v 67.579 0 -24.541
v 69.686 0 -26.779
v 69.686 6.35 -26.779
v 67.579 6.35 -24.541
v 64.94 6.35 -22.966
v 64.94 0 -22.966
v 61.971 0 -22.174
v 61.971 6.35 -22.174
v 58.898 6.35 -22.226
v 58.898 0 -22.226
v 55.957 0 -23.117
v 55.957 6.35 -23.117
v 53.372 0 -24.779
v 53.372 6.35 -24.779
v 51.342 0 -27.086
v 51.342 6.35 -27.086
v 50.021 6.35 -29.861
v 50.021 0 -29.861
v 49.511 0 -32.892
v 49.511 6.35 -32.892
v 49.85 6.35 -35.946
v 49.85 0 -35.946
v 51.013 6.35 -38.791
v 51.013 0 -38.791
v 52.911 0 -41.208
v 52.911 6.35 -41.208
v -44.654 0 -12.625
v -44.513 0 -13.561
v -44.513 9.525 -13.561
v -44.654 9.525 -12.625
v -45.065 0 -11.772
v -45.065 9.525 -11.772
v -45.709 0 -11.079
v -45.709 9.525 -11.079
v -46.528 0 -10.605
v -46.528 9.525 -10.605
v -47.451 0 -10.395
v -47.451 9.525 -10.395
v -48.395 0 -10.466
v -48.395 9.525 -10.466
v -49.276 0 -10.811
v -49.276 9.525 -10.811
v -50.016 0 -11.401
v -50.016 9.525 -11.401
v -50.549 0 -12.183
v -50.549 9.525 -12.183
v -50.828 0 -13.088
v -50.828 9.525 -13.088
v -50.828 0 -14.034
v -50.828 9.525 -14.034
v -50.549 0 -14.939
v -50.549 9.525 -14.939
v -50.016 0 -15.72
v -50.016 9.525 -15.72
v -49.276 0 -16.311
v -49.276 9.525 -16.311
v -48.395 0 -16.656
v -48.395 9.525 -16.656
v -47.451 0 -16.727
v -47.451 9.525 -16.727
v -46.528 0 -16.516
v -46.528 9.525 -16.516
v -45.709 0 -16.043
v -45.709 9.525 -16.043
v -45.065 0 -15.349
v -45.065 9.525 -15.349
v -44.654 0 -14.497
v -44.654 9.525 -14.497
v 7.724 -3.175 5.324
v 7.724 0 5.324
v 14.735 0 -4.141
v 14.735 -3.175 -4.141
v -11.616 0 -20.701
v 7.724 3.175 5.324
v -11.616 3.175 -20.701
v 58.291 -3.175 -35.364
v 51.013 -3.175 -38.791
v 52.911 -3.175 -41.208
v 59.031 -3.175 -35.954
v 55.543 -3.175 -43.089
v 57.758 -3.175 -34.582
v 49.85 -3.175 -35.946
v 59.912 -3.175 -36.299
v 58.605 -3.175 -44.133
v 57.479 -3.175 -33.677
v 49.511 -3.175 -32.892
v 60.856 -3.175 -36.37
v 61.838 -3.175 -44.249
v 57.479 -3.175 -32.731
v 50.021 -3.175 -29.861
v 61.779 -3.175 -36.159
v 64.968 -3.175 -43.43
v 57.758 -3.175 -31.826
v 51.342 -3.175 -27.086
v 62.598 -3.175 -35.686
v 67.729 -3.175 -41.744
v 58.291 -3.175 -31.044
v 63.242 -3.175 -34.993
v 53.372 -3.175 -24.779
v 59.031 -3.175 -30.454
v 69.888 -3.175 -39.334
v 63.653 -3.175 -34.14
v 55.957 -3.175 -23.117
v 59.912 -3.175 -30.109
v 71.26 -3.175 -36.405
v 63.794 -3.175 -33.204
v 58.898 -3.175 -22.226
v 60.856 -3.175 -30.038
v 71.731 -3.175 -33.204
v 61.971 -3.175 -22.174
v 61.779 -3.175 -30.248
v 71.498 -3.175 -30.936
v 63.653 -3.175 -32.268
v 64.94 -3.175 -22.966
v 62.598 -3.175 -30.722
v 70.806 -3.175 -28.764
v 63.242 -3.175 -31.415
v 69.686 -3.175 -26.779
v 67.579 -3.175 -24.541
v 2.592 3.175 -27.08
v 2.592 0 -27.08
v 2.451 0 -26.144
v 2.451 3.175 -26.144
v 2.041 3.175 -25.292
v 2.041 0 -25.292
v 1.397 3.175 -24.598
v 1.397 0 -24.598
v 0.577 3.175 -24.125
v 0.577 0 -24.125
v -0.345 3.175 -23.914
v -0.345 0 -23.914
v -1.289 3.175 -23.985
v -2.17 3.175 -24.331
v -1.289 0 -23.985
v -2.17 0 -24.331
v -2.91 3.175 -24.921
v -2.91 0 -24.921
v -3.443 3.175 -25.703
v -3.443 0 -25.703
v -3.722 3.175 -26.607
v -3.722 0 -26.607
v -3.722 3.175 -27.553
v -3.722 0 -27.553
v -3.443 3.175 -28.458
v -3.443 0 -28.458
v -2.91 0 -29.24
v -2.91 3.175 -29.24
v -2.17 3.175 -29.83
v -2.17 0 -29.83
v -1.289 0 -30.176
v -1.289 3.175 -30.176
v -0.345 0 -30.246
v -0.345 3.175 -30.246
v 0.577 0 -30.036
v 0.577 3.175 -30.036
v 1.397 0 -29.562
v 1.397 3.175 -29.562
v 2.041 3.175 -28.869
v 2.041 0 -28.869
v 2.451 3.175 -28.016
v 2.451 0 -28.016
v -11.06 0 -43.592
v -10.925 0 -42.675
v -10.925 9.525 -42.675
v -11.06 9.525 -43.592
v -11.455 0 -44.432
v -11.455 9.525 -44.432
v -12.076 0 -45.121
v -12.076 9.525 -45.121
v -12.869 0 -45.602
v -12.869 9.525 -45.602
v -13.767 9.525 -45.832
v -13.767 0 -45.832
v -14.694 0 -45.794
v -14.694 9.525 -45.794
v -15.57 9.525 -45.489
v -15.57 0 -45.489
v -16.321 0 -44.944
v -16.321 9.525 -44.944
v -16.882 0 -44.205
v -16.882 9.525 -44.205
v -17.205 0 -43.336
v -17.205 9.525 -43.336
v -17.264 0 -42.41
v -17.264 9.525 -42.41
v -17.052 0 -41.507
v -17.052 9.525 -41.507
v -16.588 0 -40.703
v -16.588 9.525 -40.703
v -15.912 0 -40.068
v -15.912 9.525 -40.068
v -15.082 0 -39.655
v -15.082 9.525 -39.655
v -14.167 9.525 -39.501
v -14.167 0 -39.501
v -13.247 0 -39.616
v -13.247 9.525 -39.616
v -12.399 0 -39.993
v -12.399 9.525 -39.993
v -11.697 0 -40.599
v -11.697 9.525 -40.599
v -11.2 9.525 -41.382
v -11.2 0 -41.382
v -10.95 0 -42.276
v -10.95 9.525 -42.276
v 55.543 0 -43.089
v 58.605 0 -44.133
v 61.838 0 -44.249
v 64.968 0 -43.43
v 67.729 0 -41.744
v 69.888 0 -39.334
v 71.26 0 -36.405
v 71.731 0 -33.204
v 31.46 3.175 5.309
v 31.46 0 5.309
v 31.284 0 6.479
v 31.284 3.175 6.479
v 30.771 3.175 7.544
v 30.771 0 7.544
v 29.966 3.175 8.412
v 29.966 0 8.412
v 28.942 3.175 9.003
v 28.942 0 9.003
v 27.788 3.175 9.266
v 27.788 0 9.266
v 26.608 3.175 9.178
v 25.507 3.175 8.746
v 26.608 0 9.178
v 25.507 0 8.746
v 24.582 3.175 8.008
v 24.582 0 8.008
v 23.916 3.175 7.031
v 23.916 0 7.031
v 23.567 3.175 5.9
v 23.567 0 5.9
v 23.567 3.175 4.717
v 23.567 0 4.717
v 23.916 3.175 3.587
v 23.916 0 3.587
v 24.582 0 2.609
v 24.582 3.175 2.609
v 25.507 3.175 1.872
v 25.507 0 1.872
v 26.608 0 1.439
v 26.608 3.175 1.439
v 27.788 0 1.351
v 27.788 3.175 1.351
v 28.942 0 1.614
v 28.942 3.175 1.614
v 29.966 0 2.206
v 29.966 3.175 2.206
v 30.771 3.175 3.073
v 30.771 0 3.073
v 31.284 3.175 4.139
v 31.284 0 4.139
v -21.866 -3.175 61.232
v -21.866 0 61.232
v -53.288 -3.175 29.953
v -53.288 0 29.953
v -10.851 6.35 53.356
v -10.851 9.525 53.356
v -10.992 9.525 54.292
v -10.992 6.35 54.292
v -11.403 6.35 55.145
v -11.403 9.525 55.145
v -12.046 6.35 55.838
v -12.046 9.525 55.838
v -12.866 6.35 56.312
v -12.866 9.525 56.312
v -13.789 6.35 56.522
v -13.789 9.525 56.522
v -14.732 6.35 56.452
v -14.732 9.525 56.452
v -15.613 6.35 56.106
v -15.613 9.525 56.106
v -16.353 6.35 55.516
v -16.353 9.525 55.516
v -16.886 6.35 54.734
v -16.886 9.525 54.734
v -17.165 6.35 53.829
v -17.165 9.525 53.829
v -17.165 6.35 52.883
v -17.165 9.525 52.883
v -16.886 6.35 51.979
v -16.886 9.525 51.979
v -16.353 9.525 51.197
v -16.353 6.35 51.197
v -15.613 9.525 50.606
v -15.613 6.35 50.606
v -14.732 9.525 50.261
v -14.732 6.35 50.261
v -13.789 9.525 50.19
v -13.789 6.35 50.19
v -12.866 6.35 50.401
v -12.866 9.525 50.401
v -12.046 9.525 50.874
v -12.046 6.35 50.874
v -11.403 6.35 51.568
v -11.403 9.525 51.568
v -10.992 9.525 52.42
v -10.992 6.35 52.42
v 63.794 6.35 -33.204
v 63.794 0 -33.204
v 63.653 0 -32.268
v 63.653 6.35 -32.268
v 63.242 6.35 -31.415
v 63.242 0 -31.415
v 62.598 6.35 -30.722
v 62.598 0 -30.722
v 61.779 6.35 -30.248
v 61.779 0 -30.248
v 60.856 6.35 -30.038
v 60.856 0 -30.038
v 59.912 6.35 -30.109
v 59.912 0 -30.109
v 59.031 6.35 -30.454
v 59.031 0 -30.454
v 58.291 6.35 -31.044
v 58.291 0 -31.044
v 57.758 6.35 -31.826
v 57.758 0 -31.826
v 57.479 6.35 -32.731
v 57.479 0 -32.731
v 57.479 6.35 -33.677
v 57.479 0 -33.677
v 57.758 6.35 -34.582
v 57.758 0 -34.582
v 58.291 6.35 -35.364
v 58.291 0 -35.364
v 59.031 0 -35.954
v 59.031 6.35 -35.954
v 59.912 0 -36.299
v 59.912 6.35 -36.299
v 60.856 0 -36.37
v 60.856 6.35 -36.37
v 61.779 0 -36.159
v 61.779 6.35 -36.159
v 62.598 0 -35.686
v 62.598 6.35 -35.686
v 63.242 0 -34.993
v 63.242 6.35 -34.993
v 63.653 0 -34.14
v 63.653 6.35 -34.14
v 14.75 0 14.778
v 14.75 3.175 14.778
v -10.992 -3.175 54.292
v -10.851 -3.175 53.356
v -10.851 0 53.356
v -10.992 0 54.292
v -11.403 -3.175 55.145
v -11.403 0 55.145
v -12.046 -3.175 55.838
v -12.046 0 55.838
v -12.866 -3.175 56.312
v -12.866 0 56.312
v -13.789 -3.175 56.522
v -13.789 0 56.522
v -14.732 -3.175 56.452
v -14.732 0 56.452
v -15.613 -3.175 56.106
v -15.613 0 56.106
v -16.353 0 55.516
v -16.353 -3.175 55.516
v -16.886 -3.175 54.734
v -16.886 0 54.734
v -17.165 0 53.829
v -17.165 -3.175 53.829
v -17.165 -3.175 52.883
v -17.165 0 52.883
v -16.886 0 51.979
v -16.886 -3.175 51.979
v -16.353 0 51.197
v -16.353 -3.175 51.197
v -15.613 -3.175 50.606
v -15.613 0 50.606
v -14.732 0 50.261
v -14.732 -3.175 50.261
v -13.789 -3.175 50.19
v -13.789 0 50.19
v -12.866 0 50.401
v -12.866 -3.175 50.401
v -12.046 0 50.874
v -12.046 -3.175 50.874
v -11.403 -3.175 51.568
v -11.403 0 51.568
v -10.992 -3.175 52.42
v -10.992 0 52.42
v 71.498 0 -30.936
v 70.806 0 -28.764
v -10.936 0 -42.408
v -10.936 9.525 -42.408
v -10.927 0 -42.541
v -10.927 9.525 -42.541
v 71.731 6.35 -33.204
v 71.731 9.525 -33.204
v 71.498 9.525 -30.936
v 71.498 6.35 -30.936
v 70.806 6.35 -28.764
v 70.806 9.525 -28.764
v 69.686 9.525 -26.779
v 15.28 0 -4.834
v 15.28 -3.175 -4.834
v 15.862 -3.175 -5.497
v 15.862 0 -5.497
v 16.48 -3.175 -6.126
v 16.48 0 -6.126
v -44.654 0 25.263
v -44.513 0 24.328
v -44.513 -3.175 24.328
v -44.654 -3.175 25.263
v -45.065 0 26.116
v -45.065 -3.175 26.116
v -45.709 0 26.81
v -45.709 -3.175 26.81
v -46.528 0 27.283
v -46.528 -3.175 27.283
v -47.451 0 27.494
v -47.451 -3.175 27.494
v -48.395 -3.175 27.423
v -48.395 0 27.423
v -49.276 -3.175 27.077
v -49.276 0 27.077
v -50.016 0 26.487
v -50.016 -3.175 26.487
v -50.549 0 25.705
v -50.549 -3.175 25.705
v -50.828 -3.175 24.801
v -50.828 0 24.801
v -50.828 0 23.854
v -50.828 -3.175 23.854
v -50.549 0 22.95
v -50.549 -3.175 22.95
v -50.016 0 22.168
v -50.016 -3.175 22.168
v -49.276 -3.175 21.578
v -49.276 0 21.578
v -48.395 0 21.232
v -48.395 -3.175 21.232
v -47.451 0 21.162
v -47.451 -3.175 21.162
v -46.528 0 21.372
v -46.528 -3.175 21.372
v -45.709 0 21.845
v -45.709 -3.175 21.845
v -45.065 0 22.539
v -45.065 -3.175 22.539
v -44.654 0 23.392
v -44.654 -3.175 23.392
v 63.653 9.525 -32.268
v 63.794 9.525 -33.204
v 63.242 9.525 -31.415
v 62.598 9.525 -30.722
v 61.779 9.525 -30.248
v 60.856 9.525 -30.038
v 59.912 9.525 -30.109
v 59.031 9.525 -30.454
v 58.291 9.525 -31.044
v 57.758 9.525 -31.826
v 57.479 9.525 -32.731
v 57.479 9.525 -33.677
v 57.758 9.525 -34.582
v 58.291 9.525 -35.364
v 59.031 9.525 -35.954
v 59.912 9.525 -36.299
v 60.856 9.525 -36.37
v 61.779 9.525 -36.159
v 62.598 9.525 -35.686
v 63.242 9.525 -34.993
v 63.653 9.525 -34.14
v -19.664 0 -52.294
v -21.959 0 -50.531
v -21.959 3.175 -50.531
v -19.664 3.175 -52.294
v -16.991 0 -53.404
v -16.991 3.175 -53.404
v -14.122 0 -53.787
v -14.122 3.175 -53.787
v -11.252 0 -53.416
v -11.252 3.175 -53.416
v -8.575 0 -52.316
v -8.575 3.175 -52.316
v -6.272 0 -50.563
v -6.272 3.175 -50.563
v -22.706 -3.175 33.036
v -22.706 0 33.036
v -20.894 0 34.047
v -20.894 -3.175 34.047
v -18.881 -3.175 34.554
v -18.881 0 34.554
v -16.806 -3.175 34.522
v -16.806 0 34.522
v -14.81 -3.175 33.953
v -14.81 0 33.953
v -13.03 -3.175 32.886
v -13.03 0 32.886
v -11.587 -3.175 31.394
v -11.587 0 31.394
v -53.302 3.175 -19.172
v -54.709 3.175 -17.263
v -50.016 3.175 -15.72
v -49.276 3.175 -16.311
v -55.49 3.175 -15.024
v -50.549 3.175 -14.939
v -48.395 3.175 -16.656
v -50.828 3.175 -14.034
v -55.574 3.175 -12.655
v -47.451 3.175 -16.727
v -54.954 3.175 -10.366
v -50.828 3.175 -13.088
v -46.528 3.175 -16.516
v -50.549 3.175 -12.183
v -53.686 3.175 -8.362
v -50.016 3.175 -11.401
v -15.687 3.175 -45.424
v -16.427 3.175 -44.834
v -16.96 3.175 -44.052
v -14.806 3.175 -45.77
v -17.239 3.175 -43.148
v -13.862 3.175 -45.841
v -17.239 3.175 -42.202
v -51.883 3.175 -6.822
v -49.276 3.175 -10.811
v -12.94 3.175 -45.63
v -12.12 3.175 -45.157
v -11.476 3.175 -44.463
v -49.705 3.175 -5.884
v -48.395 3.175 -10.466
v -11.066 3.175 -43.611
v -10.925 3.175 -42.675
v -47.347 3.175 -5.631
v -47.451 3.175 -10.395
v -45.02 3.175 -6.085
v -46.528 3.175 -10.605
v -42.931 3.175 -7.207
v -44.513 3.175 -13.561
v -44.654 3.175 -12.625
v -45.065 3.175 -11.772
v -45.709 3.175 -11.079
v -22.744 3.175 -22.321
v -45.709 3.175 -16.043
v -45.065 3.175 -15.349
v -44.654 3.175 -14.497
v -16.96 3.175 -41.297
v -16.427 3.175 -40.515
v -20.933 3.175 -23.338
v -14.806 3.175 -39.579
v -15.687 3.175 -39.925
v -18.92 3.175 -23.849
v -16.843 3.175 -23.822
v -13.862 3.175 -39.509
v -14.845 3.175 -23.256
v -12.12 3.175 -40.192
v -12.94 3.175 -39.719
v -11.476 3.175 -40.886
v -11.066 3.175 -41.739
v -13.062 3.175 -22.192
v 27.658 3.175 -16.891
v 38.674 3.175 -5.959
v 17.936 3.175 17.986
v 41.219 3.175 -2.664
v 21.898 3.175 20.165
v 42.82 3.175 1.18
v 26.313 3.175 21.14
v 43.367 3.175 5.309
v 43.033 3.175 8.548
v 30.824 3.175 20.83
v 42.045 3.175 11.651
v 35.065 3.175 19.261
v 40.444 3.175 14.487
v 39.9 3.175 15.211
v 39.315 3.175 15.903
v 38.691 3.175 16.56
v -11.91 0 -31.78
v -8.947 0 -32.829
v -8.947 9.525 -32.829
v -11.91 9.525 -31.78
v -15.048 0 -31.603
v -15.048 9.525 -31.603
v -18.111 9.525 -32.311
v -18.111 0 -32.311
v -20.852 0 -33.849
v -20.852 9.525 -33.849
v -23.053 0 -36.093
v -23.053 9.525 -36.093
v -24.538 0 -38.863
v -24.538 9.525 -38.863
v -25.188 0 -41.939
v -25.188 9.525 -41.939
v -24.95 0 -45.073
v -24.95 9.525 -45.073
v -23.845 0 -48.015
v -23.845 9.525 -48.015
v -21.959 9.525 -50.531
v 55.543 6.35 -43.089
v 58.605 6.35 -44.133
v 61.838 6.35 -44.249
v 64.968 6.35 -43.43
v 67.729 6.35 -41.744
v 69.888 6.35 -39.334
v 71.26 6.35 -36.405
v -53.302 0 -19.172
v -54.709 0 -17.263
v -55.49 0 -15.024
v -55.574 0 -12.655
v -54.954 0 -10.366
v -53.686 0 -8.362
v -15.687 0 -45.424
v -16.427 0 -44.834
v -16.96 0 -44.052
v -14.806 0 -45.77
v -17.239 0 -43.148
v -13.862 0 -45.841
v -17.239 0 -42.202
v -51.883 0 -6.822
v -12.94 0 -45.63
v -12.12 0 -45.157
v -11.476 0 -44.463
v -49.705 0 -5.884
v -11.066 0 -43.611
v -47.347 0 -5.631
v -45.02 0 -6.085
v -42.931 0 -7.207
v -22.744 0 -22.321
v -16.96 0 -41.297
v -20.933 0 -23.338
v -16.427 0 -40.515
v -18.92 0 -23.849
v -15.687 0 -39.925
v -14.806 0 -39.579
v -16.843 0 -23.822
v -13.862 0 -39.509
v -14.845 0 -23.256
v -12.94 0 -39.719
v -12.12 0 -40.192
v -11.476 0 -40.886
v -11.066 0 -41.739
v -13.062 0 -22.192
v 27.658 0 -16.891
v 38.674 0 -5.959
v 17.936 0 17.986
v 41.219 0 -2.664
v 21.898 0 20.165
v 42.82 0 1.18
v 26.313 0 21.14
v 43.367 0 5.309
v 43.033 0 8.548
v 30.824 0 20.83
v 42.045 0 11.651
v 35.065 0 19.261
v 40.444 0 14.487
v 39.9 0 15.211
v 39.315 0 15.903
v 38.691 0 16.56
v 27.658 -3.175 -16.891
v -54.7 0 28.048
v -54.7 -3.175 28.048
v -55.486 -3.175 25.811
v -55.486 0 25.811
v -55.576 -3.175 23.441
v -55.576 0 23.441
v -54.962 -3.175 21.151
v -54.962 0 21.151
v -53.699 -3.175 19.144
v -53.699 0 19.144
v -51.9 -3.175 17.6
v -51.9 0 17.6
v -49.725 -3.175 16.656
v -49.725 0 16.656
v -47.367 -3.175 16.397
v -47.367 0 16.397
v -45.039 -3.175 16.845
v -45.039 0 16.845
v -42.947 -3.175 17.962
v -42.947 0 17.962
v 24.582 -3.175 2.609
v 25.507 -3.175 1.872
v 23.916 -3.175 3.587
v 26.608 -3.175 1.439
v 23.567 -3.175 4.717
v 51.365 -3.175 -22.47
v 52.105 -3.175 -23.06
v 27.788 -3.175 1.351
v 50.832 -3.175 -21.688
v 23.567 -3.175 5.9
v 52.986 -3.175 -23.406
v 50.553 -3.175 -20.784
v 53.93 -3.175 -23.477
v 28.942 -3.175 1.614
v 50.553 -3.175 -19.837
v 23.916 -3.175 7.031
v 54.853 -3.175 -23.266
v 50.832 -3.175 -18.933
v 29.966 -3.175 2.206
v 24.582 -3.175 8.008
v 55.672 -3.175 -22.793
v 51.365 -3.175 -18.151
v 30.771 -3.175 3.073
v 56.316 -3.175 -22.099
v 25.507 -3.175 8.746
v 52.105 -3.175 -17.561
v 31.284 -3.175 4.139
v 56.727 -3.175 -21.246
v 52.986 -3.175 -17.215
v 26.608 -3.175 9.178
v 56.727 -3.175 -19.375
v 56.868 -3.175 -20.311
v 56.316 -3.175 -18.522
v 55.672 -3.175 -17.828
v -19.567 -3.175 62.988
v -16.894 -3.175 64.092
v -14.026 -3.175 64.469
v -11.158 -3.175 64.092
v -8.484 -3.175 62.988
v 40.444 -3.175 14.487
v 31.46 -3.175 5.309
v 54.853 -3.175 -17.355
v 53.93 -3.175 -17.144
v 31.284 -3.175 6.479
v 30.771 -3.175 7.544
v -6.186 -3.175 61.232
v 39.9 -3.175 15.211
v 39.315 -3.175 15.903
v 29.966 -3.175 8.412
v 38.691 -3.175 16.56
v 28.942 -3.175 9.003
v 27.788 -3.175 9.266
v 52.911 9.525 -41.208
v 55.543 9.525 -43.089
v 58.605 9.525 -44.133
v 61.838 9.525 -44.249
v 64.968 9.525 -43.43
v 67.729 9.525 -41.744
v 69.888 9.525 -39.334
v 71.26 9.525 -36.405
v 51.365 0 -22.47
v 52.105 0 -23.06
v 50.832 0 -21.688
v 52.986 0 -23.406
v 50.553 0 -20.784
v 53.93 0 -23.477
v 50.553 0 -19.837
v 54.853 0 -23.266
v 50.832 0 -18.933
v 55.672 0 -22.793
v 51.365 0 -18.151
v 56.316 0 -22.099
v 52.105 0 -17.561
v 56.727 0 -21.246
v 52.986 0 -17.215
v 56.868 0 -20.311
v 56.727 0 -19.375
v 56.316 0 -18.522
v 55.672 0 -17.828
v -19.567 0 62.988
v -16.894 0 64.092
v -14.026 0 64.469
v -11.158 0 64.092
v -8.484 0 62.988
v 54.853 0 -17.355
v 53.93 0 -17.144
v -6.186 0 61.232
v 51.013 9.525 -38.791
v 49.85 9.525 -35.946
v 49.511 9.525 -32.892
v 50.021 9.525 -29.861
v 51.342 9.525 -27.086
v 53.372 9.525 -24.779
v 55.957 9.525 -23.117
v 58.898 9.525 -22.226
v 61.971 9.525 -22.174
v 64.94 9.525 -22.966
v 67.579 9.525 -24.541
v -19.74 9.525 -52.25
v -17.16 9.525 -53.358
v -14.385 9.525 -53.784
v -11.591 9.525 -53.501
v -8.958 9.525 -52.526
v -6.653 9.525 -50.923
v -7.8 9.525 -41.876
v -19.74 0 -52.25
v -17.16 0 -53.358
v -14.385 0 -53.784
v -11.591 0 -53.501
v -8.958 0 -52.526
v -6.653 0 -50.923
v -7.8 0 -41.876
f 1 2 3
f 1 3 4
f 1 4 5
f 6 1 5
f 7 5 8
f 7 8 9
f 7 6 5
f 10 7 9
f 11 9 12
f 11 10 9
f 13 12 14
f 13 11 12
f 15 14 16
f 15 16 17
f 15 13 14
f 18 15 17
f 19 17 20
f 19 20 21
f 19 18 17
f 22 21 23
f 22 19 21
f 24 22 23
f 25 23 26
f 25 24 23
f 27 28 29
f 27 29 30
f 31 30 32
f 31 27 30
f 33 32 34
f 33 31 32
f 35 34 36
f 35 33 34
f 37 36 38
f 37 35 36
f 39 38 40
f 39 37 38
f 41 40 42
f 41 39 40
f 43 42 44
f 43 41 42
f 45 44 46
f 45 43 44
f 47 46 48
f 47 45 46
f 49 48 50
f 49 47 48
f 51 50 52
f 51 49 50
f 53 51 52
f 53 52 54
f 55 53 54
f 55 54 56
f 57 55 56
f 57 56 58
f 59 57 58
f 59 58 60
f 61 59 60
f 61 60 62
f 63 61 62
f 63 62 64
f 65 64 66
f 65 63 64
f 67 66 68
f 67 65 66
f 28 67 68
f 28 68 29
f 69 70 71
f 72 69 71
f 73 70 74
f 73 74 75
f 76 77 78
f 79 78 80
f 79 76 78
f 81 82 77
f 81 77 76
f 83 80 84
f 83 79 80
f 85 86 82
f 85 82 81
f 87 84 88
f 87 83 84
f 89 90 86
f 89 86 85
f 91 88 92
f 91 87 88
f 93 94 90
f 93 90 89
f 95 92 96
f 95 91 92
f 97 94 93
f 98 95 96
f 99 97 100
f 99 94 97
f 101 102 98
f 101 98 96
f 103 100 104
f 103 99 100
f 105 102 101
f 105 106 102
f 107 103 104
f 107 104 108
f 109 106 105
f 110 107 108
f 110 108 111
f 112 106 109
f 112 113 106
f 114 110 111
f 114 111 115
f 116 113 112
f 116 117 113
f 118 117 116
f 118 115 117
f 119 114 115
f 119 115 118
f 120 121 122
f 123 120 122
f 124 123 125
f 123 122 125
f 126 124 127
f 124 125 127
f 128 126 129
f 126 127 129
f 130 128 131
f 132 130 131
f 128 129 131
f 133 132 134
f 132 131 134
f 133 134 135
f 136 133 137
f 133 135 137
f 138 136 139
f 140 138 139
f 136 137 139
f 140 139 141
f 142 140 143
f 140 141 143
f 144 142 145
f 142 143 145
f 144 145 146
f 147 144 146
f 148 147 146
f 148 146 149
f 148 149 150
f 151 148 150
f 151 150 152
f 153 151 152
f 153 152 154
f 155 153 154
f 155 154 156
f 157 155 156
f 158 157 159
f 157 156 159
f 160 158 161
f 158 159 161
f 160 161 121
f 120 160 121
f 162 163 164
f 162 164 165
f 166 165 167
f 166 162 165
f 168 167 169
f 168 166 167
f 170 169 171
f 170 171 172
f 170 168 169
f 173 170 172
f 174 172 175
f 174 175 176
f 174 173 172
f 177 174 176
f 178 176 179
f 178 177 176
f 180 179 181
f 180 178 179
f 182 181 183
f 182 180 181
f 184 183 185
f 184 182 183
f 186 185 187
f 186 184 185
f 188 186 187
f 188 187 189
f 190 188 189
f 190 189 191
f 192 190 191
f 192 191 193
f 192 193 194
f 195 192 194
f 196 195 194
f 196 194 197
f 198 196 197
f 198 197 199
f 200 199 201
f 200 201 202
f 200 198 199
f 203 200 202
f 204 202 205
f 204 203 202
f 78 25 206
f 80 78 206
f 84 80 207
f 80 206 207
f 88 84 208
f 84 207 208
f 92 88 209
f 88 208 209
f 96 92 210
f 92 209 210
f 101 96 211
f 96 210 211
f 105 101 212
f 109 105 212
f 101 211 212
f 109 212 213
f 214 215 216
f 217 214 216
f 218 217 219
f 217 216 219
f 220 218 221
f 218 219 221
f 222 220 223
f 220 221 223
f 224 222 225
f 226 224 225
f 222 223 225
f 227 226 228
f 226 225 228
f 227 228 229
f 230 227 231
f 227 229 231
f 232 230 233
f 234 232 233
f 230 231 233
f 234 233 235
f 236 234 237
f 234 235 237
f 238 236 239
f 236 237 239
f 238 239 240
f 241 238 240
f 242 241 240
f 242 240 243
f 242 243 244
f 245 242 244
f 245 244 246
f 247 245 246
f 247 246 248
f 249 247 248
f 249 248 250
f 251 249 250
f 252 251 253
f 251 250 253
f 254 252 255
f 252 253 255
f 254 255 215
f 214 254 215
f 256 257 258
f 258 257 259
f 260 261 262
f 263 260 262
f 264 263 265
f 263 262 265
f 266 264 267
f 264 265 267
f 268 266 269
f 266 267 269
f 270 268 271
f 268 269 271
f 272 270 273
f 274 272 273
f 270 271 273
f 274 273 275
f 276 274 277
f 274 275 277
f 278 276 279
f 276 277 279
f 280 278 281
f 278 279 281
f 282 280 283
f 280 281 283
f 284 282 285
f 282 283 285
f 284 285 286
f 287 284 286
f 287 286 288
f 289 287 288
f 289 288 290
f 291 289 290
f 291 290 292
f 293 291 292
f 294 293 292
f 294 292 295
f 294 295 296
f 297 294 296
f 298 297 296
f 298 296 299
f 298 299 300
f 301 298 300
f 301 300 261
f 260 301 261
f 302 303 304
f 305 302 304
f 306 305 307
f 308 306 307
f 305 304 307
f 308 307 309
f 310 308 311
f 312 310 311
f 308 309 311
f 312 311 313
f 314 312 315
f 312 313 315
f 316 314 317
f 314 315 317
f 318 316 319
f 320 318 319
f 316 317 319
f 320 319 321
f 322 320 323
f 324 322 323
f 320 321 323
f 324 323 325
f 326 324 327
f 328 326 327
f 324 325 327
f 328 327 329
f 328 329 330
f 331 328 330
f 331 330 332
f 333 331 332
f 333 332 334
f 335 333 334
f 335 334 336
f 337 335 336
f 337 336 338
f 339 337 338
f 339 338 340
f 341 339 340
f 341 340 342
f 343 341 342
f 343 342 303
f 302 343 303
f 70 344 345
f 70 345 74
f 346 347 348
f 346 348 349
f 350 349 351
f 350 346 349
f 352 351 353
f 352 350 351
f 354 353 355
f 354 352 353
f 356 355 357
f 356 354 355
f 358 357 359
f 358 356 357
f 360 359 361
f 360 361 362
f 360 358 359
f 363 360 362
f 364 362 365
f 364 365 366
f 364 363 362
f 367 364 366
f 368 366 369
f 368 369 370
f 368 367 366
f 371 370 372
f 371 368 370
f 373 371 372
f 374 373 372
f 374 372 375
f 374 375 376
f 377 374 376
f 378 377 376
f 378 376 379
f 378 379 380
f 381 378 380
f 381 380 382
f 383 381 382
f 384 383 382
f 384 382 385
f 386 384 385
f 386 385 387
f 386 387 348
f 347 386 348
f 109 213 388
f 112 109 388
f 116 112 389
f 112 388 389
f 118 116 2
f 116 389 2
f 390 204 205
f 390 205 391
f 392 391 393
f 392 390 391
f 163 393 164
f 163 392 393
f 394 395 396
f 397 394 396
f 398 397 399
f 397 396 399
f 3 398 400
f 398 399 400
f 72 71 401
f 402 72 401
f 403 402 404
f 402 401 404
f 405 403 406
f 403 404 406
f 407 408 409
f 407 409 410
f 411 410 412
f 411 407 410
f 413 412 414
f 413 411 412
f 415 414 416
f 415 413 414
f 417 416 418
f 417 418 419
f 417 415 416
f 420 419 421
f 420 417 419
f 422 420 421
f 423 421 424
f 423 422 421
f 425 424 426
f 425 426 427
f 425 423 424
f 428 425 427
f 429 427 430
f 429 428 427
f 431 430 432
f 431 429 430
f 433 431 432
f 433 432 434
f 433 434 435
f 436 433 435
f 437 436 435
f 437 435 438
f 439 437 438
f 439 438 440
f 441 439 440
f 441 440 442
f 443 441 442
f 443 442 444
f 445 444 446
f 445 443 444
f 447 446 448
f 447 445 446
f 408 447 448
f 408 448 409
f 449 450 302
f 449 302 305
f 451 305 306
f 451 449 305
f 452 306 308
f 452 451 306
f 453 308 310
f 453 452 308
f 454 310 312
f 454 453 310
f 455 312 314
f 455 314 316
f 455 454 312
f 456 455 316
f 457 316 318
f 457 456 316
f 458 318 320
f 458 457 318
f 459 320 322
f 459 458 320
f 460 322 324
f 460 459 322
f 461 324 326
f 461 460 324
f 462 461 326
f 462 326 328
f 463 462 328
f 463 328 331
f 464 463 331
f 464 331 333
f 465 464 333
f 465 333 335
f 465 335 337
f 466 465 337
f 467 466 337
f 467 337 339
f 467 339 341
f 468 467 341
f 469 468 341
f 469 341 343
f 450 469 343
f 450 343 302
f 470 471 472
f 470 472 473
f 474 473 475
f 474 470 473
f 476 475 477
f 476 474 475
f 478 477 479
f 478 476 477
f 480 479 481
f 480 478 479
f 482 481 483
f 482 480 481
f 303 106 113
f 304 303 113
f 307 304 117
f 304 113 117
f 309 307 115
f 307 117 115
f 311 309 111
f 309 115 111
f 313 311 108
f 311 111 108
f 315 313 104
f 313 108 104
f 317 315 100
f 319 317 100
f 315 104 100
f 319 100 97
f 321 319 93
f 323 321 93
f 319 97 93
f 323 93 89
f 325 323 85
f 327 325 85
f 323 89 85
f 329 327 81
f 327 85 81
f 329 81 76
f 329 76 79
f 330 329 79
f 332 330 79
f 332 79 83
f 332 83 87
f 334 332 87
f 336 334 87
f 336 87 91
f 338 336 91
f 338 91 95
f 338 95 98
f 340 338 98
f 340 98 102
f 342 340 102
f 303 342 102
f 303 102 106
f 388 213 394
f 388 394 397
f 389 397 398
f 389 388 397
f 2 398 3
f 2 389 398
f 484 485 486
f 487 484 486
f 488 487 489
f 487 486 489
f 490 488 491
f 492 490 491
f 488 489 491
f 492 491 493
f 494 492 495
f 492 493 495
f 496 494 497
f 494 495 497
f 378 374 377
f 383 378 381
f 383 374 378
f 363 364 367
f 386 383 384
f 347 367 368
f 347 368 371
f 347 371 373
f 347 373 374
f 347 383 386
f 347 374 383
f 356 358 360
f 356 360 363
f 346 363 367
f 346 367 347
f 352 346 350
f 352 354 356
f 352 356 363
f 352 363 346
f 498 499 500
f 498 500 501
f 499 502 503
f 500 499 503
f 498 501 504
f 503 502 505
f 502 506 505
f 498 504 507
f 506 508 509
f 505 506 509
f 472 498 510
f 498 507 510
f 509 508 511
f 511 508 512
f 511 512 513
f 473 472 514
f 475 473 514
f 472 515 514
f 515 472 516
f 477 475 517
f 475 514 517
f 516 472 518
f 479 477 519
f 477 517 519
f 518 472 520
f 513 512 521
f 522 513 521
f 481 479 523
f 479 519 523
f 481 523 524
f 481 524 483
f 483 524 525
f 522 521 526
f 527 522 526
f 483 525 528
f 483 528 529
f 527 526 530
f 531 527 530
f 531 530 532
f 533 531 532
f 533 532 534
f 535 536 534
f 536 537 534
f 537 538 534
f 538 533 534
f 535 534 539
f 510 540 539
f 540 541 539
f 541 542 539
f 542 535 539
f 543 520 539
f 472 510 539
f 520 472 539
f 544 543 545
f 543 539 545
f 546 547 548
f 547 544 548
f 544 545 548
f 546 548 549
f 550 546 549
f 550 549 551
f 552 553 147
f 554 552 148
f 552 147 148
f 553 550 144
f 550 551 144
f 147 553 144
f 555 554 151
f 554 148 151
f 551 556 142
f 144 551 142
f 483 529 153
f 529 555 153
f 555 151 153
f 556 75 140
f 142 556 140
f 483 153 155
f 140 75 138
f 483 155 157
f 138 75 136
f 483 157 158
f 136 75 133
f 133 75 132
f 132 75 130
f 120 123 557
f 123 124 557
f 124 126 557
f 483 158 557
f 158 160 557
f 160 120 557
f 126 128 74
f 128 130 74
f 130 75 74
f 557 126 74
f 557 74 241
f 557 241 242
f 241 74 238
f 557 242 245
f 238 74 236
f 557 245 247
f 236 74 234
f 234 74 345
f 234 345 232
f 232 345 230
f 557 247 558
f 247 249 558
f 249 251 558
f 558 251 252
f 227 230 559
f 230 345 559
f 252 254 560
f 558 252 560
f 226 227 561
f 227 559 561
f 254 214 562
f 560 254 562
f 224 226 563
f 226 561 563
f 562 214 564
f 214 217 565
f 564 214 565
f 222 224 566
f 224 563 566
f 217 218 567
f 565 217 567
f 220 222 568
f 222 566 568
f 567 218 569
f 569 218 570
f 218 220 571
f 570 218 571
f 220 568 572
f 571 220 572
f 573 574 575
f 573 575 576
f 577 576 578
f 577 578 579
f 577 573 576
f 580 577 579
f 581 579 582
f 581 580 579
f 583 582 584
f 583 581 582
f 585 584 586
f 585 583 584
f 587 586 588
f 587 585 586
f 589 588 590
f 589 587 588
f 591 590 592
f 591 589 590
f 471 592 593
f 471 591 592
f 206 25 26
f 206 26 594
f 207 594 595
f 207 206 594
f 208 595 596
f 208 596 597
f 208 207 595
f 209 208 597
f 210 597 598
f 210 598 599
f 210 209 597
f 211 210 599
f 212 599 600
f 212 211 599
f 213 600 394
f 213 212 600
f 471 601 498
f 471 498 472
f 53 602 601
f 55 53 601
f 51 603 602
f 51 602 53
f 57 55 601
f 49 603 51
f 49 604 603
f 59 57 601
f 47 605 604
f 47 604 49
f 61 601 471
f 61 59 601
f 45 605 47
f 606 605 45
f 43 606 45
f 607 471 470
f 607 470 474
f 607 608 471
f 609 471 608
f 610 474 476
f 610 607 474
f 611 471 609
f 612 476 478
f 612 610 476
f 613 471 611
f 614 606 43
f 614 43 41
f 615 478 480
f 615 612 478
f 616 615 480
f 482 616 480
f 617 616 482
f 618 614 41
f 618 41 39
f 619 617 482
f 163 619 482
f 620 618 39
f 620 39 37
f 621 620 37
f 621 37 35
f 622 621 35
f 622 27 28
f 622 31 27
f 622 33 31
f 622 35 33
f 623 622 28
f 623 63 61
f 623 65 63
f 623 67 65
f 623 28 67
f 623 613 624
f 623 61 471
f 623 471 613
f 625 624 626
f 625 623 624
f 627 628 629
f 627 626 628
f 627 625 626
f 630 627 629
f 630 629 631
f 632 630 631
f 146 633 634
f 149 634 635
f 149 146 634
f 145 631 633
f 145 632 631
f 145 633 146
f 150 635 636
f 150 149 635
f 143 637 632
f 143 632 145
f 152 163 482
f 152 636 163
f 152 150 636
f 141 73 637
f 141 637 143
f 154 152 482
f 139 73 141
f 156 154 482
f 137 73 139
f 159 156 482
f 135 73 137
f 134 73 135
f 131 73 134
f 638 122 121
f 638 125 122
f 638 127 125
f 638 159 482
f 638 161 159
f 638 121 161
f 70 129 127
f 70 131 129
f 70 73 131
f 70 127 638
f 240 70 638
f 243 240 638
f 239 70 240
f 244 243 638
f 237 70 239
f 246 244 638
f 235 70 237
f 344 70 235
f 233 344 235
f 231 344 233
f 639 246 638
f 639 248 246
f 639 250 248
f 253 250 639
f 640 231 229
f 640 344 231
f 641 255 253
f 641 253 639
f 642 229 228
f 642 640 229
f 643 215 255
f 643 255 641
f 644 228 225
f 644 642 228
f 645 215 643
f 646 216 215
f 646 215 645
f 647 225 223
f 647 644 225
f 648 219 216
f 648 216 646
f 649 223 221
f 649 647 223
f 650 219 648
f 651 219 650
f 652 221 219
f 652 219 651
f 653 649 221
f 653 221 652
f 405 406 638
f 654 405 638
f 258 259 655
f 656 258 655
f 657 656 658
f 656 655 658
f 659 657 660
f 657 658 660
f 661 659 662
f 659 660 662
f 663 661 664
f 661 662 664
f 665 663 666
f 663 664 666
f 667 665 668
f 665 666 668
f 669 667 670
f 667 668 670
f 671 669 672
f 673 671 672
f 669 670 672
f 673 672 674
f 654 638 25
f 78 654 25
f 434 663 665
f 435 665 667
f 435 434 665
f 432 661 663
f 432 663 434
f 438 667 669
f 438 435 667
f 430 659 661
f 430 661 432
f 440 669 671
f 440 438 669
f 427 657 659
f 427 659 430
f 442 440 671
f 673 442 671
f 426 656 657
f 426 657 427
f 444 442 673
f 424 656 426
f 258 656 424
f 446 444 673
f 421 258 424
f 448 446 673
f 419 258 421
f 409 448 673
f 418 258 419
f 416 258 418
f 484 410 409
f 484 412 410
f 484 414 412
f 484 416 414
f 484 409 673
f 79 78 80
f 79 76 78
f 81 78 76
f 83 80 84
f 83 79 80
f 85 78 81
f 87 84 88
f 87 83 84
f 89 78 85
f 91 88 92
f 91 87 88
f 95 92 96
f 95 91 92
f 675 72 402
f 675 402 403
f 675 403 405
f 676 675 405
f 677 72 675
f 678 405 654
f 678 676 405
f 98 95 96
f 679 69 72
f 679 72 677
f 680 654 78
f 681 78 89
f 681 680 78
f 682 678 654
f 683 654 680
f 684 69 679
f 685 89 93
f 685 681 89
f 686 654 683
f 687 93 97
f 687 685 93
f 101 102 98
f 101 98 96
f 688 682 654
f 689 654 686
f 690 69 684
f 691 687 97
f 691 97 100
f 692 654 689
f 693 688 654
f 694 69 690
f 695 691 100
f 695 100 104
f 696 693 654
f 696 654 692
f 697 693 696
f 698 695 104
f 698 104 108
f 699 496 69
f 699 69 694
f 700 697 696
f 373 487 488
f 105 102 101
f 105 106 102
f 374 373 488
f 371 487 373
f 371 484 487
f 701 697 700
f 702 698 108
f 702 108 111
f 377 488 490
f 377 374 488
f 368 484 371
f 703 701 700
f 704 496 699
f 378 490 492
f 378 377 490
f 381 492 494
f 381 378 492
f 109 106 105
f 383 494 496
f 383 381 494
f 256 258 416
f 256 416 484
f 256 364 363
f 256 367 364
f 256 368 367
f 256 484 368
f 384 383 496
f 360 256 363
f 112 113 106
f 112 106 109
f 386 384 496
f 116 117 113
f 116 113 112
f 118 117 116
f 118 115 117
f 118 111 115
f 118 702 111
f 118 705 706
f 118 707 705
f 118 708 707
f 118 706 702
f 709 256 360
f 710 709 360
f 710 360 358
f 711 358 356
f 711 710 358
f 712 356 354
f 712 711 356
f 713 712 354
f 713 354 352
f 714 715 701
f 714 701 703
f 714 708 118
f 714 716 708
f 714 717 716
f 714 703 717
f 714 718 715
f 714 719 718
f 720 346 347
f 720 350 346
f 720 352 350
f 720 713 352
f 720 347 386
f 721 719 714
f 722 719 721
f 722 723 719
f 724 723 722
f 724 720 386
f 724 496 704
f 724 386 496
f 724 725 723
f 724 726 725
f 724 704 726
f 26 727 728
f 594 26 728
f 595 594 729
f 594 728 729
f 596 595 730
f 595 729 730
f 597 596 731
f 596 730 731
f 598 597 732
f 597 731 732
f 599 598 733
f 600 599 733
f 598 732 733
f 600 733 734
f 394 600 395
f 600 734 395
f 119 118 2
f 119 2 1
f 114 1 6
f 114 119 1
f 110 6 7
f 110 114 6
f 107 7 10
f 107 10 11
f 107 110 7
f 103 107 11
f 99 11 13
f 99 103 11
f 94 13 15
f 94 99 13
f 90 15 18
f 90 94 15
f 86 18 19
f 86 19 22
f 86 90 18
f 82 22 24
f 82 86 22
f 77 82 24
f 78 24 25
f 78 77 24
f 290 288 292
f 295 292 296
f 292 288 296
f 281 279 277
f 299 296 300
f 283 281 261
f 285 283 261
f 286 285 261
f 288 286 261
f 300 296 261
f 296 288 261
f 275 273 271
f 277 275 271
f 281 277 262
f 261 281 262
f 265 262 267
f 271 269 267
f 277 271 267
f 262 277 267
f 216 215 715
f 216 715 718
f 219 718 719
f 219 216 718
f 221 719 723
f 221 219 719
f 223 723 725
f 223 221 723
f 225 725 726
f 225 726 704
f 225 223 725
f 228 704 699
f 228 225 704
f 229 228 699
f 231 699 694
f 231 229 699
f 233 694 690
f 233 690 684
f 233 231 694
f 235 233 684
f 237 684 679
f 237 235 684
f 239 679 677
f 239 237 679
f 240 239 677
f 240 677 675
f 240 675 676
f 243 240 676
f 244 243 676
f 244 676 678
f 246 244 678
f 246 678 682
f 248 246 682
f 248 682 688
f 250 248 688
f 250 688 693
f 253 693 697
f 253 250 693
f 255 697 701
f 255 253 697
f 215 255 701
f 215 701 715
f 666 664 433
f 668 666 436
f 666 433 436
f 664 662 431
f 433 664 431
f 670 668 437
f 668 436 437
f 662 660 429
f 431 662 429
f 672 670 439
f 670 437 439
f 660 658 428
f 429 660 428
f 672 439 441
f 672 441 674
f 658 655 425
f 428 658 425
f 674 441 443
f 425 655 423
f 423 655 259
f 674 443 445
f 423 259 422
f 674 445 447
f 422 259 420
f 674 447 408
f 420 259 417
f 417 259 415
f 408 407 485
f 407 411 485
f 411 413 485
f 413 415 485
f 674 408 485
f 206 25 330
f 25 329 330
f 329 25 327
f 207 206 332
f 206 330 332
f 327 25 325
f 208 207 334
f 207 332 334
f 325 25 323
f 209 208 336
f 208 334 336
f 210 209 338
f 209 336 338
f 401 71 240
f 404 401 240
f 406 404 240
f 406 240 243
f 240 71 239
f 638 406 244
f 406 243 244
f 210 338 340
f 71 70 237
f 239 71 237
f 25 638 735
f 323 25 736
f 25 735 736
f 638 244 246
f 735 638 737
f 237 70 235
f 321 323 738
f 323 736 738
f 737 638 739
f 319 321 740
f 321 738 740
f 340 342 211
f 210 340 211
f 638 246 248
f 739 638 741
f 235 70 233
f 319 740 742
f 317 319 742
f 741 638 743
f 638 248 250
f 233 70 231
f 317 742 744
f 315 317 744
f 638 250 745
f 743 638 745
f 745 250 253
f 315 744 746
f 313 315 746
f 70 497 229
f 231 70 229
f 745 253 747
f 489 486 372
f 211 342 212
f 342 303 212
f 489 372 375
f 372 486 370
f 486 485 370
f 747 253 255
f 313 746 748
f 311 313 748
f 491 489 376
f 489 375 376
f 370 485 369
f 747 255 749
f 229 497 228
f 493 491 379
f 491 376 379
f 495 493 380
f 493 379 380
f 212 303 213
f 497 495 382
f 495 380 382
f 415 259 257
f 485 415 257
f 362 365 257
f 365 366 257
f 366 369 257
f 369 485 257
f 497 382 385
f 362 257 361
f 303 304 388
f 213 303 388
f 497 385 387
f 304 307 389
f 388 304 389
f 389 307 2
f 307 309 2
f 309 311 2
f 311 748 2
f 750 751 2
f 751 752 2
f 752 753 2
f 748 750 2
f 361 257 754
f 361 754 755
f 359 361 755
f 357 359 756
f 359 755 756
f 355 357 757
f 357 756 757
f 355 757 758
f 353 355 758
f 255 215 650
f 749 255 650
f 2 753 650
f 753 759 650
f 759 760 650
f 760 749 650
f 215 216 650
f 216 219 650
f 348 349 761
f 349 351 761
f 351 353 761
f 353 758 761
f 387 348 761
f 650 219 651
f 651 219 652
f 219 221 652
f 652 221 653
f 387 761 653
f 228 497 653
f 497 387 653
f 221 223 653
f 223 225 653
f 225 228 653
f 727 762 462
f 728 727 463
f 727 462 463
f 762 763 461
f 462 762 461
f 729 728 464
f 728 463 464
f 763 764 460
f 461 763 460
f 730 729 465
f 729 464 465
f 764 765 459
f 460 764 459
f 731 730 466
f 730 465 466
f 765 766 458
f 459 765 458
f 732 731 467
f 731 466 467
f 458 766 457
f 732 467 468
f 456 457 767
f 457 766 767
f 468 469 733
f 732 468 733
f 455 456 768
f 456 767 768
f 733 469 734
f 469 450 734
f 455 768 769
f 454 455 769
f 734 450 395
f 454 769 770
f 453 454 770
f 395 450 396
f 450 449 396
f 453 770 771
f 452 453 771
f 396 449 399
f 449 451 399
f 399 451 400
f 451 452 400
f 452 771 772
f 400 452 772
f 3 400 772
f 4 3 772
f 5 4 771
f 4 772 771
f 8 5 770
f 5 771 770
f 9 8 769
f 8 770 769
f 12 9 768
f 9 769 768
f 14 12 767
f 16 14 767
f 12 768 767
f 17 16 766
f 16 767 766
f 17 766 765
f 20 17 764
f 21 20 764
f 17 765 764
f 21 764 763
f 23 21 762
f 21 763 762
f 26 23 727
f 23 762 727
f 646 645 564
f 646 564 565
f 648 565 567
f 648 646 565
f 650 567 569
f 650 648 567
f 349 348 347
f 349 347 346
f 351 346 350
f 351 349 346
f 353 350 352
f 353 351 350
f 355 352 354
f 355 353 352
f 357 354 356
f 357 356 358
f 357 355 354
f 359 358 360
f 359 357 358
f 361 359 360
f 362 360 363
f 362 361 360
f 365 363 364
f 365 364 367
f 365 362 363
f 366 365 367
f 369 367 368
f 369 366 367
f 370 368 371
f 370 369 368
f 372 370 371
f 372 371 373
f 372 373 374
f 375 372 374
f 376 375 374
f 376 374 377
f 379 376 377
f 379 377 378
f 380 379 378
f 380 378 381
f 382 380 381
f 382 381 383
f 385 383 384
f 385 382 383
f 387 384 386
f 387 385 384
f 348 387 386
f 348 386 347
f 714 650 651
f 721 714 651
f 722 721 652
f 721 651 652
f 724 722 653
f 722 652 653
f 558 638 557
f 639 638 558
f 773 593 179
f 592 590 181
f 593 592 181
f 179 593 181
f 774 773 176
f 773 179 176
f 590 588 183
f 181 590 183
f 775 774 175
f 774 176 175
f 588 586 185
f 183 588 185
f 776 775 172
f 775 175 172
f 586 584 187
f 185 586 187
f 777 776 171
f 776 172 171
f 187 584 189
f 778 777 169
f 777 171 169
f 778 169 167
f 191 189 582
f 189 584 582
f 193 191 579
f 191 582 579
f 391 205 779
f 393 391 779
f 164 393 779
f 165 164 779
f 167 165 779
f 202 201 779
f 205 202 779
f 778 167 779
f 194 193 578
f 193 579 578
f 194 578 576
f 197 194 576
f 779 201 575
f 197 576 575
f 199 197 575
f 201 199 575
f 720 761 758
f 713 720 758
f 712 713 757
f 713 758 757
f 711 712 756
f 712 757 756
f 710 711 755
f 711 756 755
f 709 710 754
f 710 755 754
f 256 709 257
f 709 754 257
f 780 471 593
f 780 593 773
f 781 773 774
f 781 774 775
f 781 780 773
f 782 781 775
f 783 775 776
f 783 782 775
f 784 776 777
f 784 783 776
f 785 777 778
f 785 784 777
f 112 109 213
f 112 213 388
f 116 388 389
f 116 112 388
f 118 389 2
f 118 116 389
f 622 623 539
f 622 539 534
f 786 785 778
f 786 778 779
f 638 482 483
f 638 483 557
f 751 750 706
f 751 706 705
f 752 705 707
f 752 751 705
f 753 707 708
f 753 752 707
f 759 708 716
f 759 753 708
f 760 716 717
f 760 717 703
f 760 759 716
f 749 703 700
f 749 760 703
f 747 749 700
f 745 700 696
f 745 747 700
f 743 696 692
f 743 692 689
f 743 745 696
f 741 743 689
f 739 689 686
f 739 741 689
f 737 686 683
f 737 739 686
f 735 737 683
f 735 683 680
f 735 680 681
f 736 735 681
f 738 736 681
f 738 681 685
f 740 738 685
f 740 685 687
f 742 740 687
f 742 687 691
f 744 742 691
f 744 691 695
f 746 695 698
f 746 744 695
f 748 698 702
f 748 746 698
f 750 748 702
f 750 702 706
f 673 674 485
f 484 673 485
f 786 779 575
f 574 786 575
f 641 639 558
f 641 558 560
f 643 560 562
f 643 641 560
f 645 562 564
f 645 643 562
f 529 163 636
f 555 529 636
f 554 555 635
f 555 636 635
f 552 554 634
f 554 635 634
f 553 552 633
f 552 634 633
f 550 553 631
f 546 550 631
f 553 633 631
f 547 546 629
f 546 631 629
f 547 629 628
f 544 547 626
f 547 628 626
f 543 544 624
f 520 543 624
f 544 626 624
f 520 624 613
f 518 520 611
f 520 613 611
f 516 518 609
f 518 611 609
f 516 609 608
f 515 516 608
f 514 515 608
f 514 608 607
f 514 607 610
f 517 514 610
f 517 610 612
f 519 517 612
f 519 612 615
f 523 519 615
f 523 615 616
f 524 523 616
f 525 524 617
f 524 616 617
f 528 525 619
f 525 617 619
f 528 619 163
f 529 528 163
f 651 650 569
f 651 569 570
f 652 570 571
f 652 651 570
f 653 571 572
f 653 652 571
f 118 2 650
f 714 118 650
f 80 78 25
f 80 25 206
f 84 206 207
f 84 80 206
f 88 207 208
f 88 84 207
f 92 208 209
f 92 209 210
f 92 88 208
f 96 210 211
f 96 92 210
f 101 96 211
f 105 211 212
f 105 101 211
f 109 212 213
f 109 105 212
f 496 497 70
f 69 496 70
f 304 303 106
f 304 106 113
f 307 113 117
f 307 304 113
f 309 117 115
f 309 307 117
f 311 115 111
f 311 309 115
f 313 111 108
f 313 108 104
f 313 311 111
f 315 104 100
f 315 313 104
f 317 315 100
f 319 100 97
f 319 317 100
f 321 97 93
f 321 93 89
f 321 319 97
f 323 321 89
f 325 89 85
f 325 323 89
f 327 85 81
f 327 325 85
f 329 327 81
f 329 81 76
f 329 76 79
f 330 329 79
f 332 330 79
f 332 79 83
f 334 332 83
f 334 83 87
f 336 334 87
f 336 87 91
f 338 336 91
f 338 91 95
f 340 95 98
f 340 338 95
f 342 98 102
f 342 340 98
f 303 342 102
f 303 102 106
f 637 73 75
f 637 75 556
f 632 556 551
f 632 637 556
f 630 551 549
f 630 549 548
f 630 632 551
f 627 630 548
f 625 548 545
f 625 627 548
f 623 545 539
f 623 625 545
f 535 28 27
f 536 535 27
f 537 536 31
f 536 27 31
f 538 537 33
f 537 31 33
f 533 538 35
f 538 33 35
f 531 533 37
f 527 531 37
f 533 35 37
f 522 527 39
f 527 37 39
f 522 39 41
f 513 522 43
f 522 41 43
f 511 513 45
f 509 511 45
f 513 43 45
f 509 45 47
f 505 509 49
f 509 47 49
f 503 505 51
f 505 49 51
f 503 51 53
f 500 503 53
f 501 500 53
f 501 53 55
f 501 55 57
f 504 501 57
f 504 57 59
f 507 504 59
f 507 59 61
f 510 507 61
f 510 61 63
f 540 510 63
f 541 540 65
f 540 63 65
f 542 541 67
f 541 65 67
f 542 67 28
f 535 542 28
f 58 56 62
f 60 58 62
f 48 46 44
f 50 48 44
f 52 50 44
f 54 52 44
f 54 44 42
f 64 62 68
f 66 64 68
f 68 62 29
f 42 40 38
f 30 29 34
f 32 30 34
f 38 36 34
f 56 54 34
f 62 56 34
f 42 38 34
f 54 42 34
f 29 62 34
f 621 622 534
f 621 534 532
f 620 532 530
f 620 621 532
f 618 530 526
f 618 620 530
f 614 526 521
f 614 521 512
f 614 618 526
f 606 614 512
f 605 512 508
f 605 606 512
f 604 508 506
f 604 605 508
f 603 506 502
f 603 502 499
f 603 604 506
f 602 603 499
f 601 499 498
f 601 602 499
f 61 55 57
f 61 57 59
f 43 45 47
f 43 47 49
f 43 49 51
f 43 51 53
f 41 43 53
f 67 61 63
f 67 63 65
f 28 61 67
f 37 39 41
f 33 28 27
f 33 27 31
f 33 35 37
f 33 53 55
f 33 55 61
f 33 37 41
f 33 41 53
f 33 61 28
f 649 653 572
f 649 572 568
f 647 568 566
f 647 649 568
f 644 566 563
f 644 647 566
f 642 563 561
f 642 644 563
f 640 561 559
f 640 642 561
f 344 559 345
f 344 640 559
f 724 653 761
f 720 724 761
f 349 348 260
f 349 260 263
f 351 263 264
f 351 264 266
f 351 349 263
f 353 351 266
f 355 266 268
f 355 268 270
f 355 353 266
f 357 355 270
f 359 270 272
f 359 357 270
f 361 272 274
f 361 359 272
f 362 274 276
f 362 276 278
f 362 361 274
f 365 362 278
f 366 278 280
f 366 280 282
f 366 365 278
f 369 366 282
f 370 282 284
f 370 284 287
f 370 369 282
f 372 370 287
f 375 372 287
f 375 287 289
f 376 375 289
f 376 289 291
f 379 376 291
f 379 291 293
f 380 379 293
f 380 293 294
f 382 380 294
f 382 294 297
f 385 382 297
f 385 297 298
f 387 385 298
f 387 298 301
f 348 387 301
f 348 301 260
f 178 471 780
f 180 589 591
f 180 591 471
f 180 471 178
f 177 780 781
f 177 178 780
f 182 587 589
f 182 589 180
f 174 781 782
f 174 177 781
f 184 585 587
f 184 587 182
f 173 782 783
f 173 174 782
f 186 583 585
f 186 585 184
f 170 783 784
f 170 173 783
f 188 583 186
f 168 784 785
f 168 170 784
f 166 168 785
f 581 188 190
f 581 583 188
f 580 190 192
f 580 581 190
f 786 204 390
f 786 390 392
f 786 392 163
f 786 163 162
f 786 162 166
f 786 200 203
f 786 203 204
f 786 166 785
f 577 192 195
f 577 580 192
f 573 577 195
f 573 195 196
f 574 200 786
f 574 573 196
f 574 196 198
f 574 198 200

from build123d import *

# Parameters (mm, degrees)
F0_R     = 3.175
F0_R_2   = 3.96875
F1_DEPTH = 3.175
F2_DEPTH = 3.175
F4_R     = 3.175
F6_DEPTH = 9.525
F3_R     = 3.175


# Not quite as in the source:
# - a pattern or mirror of a feature is missing from the dataset's text; its kind, count and spacing are read off the source's solid


with BuildPart() as f1:
    # F0 (on Front) → F1 (new body)
    with BuildSketch(Plane.XZ):
        with BuildLine():
            ThreePointArc((14.7496603052, 14.7775566037), (26.3131341296, 21.1399199057), (38.6911584981, 16.5597336206))
            Line((38.6911584981, 16.5597336206), (-6.186140597, 61.2318347541))
            ThreePointArc((-6.186140597, 61.2318347541), (-3.7641062388, 57.6204552843), (-2.9133385399, 53.3561257439))
            ThreePointArc((-2.9133385399, 53.3561257439), (-18.2901680804, 43.0943934427), (-21.8655364829, 61.2318347541))
            Line((-21.8655364829, 61.2318347541), (-53.2879053781, 29.953142198))
            ThreePointArc((-53.2879053781, 29.953142198), (-44.6421714614, 31.6574445487), (-39.7506211331, 24.3276357622))
            ThreePointArc((-39.7506211331, 24.3276357622), (-40.5946025832, 20.7659085362), (-42.9470685869, 17.9616066227))
            Line((-42.9470685869, 17.9616066227), (-22.7062919024, 33.0357735381))
            ThreePointArc((-22.7062919024, 33.0357735381), (-16.8060800027, 34.5221488612), (-11.587003326, 31.3943619908))
            Line((-11.587003326, 31.3943619908), (7.72443139, 5.3239158017))
            Line((7.72443139, 5.3239158017), (14.7496603052, 14.7775566037))
        make_face()
        with BuildLine():
            ThreePointArc((52.9106217019, -41.2084486244), (53.372225282, -24.7793229574), (69.6857179674, -26.7791240605))
            Line((69.6857179674, -26.7791240605), (40.4443254491, 14.4870795127))
            ThreePointArc((40.4443254491, 14.4870795127), (42.6183923822, 10.124888825), (43.3665900081, 5.3087207489))
            ThreePointArc((43.3665900081, 5.3087207489), (42.1465203967, -0.7944456676), (38.6738479221, -5.9594970758))
            Line((38.6738479221, -5.9594970758), (27.6583771328, -16.8909360421))
            Line((27.6583771328, -16.8909360421), (52.9106217019, -41.2084486244))
        make_face()
        with Locations((53.6926918641, -20.310522387)):
            Circle(F0_R, mode=Mode.SUBTRACT)
        with BuildLine():
            ThreePointArc((-2.9133385399, 53.3561257439), (-3.7641062388, 57.6204552843), (-6.186140597, 61.2318347541))
            ThreePointArc((-6.186140597, 61.2318347541), (-14.0258385399, 64.4686257439), (-21.8655364829, 61.2318347541))
            ThreePointArc((-21.8655364829, 61.2318347541), (-18.2901680804, 43.0943934427), (-2.9133385399, 53.3561257439))
        make_face()
        with Locations((-14.0258385399, 53.3561257439)):
            Circle(F0_R, mode=Mode.SUBTRACT)
        with BuildLine():
            ThreePointArc((-39.7506211331, 24.3276357622), (-44.6421714614, 31.6574445487), (-53.2879053781, 29.953142198))
            ThreePointArc((-53.2879053781, 29.953142198), (-53.6992430247, 19.1439768369), (-42.9470685869, 17.9616066227))
            ThreePointArc((-42.9470685869, 17.9616066227), (-40.5946025832, 20.7659085362), (-39.7506211331, 24.3276357622))
        make_face()
        with Locations((-47.6881211331, 24.3276357622)):
            Circle(F0_R, mode=Mode.SUBTRACT)
        with BuildLine():
            ThreePointArc((52.9106217019, -41.2084486244), (64.9679691599, -43.4300404866), (71.7313031587, -33.2039751952))
            ThreePointArc((71.7313031587, -33.2039751952), (71.2075648205, -29.8326575419), (69.6857179674, -26.7791240605))
            ThreePointArc((69.6857179674, -26.7791240605), (53.372225282, -24.7793229574), (52.9106217019, -41.2084486244))
        make_face()
        with Locations((60.6188031587, -33.2039751952)):
            Circle(F0_R, mode=Mode.SUBTRACT)
        with BuildLine():
            ThreePointArc((43.3665900081, 5.3087207489), (42.6183923822, 10.124888825), (40.4443254491, 14.4870795127))
            ThreePointArc((40.4443254491, 14.4870795127), (39.6121271272, 15.5609500159), (38.6911584981, 16.5597336206))
            ThreePointArc((38.6911584981, 16.5597336206), (26.3131341296, 21.1399199057), (14.7496603052, 14.7775566037))
            ThreePointArc((14.7496603052, 14.7775566037), (11.6165946984, 5.3209238883), (14.7351179476, -4.1405144355))
            ThreePointArc((14.7351179476, -4.1405144355), (15.5661074803, -5.1697567874), (16.4799022127, -6.1262412929))
            ThreePointArc((16.4799022127, -6.1262412929), (27.6108563061, -10.5658312306), (38.6738479221, -5.9594970758))
            ThreePointArc((38.6738479221, -5.9594970758), (42.1465203967, -0.7944456676), (43.3665900081, 5.3087207489))
        make_face()
        with Locations((27.4915900081, 5.3087207489)):
            Circle(F0_R_2, mode=Mode.SUBTRACT)
        with BuildLine():
            ThreePointArc((14.7351179476, -4.1405144355), (11.6165946984, 5.3209238883), (14.7496603052, 14.7775566037))
            Line((14.7496603052, 14.7775566037), (7.72443139, 5.3239158017))
            Line((7.72443139, 5.3239158017), (14.7351179476, -4.1405144355))
        make_face()
        with BuildLine():
            Line((16.4799022127, -6.1262412929), (27.6583771328, -16.8909360421))
            Line((27.6583771328, -16.8909360421), (38.6738479221, -5.9594970758))
            ThreePointArc((38.6738479221, -5.9594970758), (27.6108563061, -10.5658312306), (16.4799022127, -6.1262412929))
        make_face()
    extrude(amount=F1_DEPTH)


with BuildPart() as f2:
    # F0 (on Front) → F2 (new body)
    with BuildSketch(Plane.XZ):
        with BuildLine():
            ThreePointArc((-21.9593287693, -50.530575103), (-14.1223086093, -53.7872753618), (-6.2720771563, -50.5625509241))
            ThreePointArc((-6.2720771563, -50.5625509241), (-3.8412064241, -46.9470149384), (-2.9871576961, -42.6747984468))
            ThreePointArc((-2.9871576961, -42.6747984468), (-18.3509552303, -32.4076603098), (-21.9593287693, -50.530575103))
        make_face()
        with Locations((-14.0996576961, -42.6747984468)):
            Circle(F0_R, mode=Mode.SUBTRACT)
        with BuildLine():
            ThreePointArc((-42.9309189236, -7.2069551619), (-53.6860610326, -8.3620190908), (-53.3021718997, -19.172194094))
            ThreePointArc((-53.3021718997, -19.172194094), (-44.6514800372, -20.8945951518), (-39.7506211331, -13.5609250539))
            ThreePointArc((-39.7506211331, -13.5609250539), (-40.5900862364, -10.0082068191), (-42.9309189236, -7.2069551619))
        make_face()
        with Locations((-47.6881211331, -13.5609250539)):
            Circle(F0_R, mode=Mode.SUBTRACT)
        with BuildLine():
            Line((16.4799022127, -6.1262412929), (27.6583771328, -16.8909360421))
            Line((27.6583771328, -16.8909360421), (38.6738479221, -5.9594970758))
            ThreePointArc((38.6738479221, -5.9594970758), (27.6108563061, -10.5658312306), (16.4799022127, -6.1262412929))
        make_face()
        with BuildLine():
            ThreePointArc((43.3665900081, 5.3087207489), (42.6183923822, 10.124888825), (40.4443254491, 14.4870795127))
            ThreePointArc((40.4443254491, 14.4870795127), (39.6121271272, 15.5609500159), (38.6911584981, 16.5597336206))
            ThreePointArc((38.6911584981, 16.5597336206), (26.3131341296, 21.1399199057), (14.7496603052, 14.7775566037))
            ThreePointArc((14.7496603052, 14.7775566037), (11.6165946984, 5.3209238883), (14.7351179476, -4.1405144355))
            ThreePointArc((14.7351179476, -4.1405144355), (15.5661074803, -5.1697567874), (16.4799022127, -6.1262412929))
            ThreePointArc((16.4799022127, -6.1262412929), (27.6108563061, -10.5658312306), (38.6738479221, -5.9594970758))
            ThreePointArc((38.6738479221, -5.9594970758), (42.1465203967, -0.7944456676), (43.3665900081, 5.3087207489))
        make_face()
        with Locations((27.4915900081, 5.3087207489)):
            Circle(F0_R_2, mode=Mode.SUBTRACT)
        with BuildLine():
            Line((-6.2720771563, -50.5625509241), (27.6583771328, -16.8909360421))
            Line((27.6583771328, -16.8909360421), (16.4799022127, -6.1262412929))
            ThreePointArc((16.4799022127, -6.1262412929), (15.5661074803, -5.1697567874), (14.7351179476, -4.1405144355))
            Line((14.7351179476, -4.1405144355), (7.72443139, 5.3239158017))
            Line((7.72443139, 5.3239158017), (-11.6156424823, -20.7014441798))
            ThreePointArc((-11.6156424823, -20.7014441798), (-16.8434561593, -23.8217771487), (-22.7438095433, -22.3209961443))
            Line((-22.7438095433, -22.3209961443), (-42.9309189236, -7.2069551619))
            ThreePointArc((-42.9309189236, -7.2069551619), (-40.5900862364, -10.0082068191), (-39.7506211331, -13.5609250539))
            ThreePointArc((-39.7506211331, -13.5609250539), (-44.6514800372, -20.8945951518), (-53.3021718997, -19.172194094))
            Line((-53.3021718997, -19.172194094), (-21.9593287693, -50.530575103))
            ThreePointArc((-21.9593287693, -50.530575103), (-18.3509552303, -32.4076603098), (-2.9871576961, -42.6747984468))
            ThreePointArc((-2.9871576961, -42.6747984468), (-3.8412064241, -46.9470149384), (-6.2720771563, -50.5625509241))
        make_face()
        with Locations((-0.5825021922, -27.0801547082)):
            Circle(F0_R, mode=Mode.SUBTRACT)
        with BuildLine():
            ThreePointArc((14.7351179476, -4.1405144355), (11.6165946984, 5.3209238883), (14.7496603052, 14.7775566037))
            Line((14.7496603052, 14.7775566037), (7.72443139, 5.3239158017))
            Line((7.72443139, 5.3239158017), (14.7351179476, -4.1405144355))
        make_face()
    extrude(amount=-F2_DEPTH)


with BuildPart() as f6:
    # F4 (on face) → F6 (new body, through all)
    with BuildSketch(Plane.XZ):
        with Locations((-47.6881211331, -13.5609250539)):
            Circle(F4_R)
    extrude(amount=-F6_DEPTH)


with BuildPart() as f6b:
    # F4 (on face) → F6, piece 2 (new body, through all)
    with BuildSketch(Plane.XZ):
        with BuildLine():
            Line((-7.8000620823, -41.876302922), (-8.9468139737, -32.8291975092))
            ThreePointArc((-8.9468139737, -32.8291975092), (-23.0532279759, -36.0929115218), (-21.9593287693, -50.530575103))
            ThreePointArc((-21.9593287693, -50.530575103), (-14.3847692181, -53.7836403158), (-6.653310191, -50.9234083348))
            Line((-6.653310191, -50.9234083348), (-7.8000620823, -41.876302922))
        make_face()
        with BuildLine():
            ThreePointArc((-10.9246576961, -42.6747984468), (-17.2683508839, -42.8748196497), (-10.9498598892, -42.2755506844))
            ThreePointArc((-10.9498598892, -42.2755506844), (-10.9309645083, -42.474777244), (-10.9246576961, -42.6747984468))
        make_face(mode=Mode.SUBTRACT)
    extrude(amount=-F6_DEPTH)


with BuildPart() as f6c:
    # F3 (on face) → F6, piece 3 (new body, through all)
    with BuildSketch(Plane.XZ.offset(3.175)):
        with BuildLine():
            ThreePointArc((52.9106217019, -41.2084486244), (64.9679691599, -43.4300404866), (71.7313031587, -33.2039751952))
            ThreePointArc((71.7313031587, -33.2039751952), (71.2075648205, -29.8326575419), (69.6857179674, -26.7791240605))
            ThreePointArc((69.6857179674, -26.7791240605), (53.372225282, -24.7793229574), (52.9106217019, -41.2084486244))
        make_face()
        with Locations((60.6188031587, -33.2039751952)):
            Circle(F3_R, mode=Mode.SUBTRACT)
    extrude(amount=-F6_DEPTH)

    # F6_3_copies: F6c across plane


with BuildPart() as f6d:
    # F3 (on face) → F6, piece 4 (new body, through all)
    with BuildSketch(Plane.XZ.offset(3.175)):
        with Locations((-14.0258385399, 53.3561257439)):
            Circle(F3_R)
    extrude(amount=-F6_DEPTH)

    # F6_4_copies: F6d across plane


with BuildPart() as f6c_1:
    add(f6c.part)
    add(f6c.part.mirror(Plane.ZX.offset(3.175)))


with BuildPart() as f6d_1:
    add(f6d.part)
    add(f6d.part.mirror(Plane.ZX.offset(3.175)))


solid = Compound([f1.part, f2.part, f6.part, f6b.part, f6c_1.part, f6d_1.part])
